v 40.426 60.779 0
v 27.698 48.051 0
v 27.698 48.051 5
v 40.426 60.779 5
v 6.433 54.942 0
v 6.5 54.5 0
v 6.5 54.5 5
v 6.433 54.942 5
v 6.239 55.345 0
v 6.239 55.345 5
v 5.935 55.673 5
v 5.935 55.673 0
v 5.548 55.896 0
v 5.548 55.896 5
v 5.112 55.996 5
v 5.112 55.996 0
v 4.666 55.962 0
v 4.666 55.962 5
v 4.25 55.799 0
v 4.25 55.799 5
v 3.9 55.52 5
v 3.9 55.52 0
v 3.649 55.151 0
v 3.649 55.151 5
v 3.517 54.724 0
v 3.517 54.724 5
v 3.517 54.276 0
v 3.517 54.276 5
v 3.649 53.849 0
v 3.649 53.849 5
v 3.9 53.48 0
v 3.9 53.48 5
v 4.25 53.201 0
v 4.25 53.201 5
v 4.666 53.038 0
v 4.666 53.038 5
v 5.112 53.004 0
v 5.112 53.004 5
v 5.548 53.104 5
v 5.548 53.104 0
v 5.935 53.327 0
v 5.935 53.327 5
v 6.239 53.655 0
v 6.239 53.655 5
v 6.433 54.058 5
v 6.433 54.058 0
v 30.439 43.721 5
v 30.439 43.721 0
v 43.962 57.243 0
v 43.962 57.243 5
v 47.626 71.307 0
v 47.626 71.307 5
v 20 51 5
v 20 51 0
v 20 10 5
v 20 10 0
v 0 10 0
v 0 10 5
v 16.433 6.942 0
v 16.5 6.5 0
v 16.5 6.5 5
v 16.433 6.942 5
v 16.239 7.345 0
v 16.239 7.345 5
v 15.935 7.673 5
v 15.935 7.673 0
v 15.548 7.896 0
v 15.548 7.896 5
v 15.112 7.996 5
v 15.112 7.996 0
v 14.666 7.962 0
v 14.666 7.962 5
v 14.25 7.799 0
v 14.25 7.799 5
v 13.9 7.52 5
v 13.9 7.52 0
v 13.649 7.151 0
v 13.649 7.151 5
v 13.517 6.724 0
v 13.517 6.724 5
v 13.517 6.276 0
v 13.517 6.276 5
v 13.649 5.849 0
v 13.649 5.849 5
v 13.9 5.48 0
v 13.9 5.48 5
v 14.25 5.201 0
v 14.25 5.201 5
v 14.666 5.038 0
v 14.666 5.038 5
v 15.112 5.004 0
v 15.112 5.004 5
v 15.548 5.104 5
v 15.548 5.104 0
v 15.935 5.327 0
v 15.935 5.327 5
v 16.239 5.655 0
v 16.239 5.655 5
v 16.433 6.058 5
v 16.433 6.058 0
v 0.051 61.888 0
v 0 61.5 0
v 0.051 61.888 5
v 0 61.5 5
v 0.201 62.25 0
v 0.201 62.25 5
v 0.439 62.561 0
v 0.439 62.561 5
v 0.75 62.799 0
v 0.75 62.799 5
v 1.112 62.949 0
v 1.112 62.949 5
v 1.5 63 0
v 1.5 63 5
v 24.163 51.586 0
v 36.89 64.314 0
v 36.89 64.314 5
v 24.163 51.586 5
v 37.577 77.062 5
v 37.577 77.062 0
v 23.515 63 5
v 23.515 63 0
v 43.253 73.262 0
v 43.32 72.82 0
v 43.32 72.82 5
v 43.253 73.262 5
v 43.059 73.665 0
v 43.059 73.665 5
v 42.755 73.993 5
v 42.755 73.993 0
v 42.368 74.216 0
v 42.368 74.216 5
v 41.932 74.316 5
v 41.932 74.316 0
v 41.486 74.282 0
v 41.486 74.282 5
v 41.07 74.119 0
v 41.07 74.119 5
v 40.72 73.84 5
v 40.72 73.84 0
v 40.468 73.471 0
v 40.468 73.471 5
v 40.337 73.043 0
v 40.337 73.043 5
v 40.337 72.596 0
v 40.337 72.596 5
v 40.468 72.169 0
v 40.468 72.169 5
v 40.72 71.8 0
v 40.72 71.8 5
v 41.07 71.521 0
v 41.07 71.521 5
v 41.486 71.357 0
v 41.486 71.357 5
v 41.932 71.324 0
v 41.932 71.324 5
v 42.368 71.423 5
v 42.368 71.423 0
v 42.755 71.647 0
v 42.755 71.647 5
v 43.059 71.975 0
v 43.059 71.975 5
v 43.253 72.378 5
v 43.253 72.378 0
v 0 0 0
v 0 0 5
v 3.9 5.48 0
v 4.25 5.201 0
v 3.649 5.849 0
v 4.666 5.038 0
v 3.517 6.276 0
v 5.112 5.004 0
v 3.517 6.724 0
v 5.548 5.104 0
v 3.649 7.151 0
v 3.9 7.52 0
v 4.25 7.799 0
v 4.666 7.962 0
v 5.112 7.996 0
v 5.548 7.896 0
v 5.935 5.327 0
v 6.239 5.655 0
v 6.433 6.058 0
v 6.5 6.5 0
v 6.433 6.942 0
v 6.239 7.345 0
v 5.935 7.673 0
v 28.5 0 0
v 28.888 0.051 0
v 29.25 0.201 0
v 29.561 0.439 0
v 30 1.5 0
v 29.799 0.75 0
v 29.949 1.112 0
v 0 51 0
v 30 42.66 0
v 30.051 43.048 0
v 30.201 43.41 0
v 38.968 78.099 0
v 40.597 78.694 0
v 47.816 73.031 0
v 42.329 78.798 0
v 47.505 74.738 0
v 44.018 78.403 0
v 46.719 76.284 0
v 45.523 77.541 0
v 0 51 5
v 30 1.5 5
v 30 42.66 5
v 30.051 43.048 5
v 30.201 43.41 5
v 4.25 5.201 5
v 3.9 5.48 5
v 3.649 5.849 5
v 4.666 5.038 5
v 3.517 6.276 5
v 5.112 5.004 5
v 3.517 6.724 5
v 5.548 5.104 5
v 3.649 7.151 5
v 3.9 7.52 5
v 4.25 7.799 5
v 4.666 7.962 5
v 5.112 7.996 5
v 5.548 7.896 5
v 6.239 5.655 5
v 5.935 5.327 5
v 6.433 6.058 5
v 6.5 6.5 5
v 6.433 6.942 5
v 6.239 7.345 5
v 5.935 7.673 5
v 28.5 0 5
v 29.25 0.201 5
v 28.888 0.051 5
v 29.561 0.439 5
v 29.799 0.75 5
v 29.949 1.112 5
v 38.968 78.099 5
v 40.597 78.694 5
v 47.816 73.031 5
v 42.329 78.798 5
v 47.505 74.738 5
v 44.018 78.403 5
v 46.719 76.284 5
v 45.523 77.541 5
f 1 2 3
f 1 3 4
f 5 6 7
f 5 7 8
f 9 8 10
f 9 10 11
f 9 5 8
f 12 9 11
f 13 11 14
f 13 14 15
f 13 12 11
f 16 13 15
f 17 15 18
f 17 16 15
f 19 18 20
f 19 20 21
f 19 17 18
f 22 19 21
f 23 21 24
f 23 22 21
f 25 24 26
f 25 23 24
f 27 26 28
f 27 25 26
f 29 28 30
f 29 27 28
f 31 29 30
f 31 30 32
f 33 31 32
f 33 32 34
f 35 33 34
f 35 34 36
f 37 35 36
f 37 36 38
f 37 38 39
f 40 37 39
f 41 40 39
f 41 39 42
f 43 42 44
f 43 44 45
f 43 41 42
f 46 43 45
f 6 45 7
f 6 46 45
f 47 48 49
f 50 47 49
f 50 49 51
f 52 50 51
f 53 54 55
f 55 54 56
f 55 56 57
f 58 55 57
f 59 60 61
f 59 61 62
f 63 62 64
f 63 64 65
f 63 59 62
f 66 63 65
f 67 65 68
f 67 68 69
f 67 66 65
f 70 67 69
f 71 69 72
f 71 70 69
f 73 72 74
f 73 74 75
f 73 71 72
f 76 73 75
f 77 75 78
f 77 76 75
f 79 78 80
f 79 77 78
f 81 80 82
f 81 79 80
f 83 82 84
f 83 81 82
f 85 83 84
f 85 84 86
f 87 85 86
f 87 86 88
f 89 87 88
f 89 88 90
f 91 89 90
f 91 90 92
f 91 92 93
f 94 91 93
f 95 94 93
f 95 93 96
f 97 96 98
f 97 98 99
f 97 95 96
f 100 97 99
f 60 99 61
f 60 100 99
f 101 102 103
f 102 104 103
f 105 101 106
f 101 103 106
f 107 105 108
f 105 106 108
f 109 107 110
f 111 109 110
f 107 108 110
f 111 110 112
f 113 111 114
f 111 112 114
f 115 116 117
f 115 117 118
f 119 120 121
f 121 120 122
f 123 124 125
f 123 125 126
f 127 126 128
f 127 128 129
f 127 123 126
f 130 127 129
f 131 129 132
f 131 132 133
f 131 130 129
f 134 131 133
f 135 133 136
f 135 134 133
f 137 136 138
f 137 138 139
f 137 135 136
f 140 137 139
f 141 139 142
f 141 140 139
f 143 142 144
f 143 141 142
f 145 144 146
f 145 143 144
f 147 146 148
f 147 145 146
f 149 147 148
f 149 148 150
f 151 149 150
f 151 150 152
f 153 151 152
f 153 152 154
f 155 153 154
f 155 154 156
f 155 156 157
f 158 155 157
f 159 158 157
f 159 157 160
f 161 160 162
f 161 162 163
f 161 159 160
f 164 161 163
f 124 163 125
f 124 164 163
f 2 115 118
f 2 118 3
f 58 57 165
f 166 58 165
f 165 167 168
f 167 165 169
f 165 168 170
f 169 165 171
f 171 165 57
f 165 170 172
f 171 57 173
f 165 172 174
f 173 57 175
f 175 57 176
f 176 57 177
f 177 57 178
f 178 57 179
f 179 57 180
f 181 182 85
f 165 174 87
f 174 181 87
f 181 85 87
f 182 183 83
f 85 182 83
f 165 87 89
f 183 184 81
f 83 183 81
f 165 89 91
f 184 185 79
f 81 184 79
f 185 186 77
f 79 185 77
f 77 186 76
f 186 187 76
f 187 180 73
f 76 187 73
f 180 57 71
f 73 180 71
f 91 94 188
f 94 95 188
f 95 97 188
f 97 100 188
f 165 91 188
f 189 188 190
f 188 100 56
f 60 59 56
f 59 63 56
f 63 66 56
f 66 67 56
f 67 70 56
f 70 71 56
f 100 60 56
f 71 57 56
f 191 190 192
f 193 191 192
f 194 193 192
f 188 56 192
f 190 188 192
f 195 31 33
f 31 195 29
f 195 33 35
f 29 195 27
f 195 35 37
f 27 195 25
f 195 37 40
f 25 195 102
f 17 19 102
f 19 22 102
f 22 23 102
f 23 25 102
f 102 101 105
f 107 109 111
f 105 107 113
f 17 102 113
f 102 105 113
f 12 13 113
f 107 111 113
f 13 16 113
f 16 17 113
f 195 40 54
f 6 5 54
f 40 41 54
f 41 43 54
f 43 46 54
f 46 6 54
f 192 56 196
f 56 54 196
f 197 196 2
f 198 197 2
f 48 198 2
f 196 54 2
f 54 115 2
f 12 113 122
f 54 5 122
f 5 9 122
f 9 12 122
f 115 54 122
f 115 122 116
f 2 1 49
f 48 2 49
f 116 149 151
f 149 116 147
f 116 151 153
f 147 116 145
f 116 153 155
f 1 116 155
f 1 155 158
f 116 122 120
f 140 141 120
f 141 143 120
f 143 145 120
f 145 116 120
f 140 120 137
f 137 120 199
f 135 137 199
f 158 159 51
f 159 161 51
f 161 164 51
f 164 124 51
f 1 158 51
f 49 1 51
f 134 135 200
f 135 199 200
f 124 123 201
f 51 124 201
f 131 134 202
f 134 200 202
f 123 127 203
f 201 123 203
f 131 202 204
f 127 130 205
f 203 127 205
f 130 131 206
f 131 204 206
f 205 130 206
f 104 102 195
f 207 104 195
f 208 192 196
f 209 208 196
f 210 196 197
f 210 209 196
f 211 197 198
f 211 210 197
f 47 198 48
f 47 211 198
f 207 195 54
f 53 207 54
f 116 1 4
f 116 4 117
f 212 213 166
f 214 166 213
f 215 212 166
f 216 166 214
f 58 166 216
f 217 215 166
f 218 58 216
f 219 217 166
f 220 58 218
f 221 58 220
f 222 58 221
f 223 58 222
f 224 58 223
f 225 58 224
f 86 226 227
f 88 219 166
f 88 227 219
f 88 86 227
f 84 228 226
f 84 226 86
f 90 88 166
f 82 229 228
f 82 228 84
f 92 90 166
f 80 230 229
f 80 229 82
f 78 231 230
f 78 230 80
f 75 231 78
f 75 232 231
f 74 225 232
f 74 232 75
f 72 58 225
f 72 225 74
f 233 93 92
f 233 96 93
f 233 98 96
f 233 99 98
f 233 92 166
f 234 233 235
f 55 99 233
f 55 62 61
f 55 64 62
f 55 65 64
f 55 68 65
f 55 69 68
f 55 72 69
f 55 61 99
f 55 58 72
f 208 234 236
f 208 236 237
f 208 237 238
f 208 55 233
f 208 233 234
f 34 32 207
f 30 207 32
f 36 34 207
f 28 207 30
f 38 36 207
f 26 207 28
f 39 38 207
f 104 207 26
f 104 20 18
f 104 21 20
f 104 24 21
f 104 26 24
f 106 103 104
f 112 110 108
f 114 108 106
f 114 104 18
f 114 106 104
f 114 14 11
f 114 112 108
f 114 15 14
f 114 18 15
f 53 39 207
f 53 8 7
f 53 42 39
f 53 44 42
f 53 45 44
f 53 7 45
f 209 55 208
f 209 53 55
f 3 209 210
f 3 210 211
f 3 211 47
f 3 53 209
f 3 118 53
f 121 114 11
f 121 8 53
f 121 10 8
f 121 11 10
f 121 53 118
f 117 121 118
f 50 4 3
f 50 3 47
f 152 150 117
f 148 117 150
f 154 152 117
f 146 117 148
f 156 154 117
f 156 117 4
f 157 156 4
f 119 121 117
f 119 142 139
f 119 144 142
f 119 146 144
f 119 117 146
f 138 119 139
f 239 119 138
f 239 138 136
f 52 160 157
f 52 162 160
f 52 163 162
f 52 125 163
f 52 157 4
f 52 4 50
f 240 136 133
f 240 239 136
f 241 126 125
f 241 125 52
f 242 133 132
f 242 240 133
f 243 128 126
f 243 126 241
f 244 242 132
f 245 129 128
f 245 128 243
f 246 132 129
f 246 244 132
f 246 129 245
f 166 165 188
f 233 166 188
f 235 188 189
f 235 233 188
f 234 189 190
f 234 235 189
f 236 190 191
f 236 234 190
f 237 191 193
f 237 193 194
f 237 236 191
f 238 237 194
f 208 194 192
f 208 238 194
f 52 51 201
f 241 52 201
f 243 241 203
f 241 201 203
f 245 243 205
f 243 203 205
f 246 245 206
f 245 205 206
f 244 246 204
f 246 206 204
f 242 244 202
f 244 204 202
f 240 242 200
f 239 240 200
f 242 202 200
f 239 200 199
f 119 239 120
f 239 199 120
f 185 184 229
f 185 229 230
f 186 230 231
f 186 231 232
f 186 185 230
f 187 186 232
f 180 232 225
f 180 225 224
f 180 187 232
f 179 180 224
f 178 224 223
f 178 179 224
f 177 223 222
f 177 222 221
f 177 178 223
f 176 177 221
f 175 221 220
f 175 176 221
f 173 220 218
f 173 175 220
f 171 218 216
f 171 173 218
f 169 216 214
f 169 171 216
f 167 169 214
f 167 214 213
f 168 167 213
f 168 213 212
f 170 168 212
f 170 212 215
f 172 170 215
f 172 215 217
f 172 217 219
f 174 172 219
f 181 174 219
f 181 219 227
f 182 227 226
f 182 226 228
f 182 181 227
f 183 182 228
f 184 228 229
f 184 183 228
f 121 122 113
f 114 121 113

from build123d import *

# Parameters (mm, degrees)
ESQUISSE1_R        = 1.5
BOSS_EXTRU_1_DEPTH = 5
CONG_3_R           = 1.5


with BuildPart() as part:
    # Esquisse1 → Boss.-Extru.1 (new body)
    with BuildSketch(Plane.XY):
        with BuildLine():
            Line((0, 10), (0, 0))
            Line((0, 0), (30, 0))
            Line((30, 0), (30, 43.28152075))
            Line((30, 43.28152075), (43.961530357, 57.243051107))
            Line((43.961530357, 57.243051107), (47.625955008, 71.306985316))
            ThreePointArc((47.625955008, 71.306985316), (44.801829917, 78.026294211), (37.577164466, 77.06244584))
            Line((37.577164466, 77.06244584), (23.514718626, 63))
            Line((23.514718626, 63), (0, 63))
            Line((0, 63), (0, 51))
            Line((0, 51), (11, 51))
            Line((11, 51), (20, 51))
            Line((20, 51), (20, 10))
            Line((20, 10), (11, 10))
            Line((11, 10), (0, 10))
        make_face()
        with Locations((5, 54.5)):
            Circle(ESQUISSE1_R, mode=Mode.SUBTRACT)
        with Locations((15, 6.5)):
            Circle(ESQUISSE1_R, mode=Mode.SUBTRACT)
        with Locations((5, 6.5)):
            Circle(ESQUISSE1_R, mode=Mode.SUBTRACT)
        with Locations((41.819805153, 72.819805153)):
            Circle(ESQUISSE1_R, mode=Mode.SUBTRACT)
        Polygon((36.890462545, 64.314118919), (24.162540484, 51.586196858), (27.69807439, 48.050662952), (40.425996451, 60.778585013), align=None, mode=Mode.SUBTRACT)
    extrude(amount=BOSS_EXTRU_1_DEPTH)

    # Congé3
    cong_3_edges = [part.edges().sort_by_distance(p)[0] for p in [
        (30, 43.28152075, 2.5),
        (30, 0, 2.5),
        (0, 63, 2.5),
    ]]
    fillet(cong_3_edges, radius=CONG_3_R)


solid = part.part
